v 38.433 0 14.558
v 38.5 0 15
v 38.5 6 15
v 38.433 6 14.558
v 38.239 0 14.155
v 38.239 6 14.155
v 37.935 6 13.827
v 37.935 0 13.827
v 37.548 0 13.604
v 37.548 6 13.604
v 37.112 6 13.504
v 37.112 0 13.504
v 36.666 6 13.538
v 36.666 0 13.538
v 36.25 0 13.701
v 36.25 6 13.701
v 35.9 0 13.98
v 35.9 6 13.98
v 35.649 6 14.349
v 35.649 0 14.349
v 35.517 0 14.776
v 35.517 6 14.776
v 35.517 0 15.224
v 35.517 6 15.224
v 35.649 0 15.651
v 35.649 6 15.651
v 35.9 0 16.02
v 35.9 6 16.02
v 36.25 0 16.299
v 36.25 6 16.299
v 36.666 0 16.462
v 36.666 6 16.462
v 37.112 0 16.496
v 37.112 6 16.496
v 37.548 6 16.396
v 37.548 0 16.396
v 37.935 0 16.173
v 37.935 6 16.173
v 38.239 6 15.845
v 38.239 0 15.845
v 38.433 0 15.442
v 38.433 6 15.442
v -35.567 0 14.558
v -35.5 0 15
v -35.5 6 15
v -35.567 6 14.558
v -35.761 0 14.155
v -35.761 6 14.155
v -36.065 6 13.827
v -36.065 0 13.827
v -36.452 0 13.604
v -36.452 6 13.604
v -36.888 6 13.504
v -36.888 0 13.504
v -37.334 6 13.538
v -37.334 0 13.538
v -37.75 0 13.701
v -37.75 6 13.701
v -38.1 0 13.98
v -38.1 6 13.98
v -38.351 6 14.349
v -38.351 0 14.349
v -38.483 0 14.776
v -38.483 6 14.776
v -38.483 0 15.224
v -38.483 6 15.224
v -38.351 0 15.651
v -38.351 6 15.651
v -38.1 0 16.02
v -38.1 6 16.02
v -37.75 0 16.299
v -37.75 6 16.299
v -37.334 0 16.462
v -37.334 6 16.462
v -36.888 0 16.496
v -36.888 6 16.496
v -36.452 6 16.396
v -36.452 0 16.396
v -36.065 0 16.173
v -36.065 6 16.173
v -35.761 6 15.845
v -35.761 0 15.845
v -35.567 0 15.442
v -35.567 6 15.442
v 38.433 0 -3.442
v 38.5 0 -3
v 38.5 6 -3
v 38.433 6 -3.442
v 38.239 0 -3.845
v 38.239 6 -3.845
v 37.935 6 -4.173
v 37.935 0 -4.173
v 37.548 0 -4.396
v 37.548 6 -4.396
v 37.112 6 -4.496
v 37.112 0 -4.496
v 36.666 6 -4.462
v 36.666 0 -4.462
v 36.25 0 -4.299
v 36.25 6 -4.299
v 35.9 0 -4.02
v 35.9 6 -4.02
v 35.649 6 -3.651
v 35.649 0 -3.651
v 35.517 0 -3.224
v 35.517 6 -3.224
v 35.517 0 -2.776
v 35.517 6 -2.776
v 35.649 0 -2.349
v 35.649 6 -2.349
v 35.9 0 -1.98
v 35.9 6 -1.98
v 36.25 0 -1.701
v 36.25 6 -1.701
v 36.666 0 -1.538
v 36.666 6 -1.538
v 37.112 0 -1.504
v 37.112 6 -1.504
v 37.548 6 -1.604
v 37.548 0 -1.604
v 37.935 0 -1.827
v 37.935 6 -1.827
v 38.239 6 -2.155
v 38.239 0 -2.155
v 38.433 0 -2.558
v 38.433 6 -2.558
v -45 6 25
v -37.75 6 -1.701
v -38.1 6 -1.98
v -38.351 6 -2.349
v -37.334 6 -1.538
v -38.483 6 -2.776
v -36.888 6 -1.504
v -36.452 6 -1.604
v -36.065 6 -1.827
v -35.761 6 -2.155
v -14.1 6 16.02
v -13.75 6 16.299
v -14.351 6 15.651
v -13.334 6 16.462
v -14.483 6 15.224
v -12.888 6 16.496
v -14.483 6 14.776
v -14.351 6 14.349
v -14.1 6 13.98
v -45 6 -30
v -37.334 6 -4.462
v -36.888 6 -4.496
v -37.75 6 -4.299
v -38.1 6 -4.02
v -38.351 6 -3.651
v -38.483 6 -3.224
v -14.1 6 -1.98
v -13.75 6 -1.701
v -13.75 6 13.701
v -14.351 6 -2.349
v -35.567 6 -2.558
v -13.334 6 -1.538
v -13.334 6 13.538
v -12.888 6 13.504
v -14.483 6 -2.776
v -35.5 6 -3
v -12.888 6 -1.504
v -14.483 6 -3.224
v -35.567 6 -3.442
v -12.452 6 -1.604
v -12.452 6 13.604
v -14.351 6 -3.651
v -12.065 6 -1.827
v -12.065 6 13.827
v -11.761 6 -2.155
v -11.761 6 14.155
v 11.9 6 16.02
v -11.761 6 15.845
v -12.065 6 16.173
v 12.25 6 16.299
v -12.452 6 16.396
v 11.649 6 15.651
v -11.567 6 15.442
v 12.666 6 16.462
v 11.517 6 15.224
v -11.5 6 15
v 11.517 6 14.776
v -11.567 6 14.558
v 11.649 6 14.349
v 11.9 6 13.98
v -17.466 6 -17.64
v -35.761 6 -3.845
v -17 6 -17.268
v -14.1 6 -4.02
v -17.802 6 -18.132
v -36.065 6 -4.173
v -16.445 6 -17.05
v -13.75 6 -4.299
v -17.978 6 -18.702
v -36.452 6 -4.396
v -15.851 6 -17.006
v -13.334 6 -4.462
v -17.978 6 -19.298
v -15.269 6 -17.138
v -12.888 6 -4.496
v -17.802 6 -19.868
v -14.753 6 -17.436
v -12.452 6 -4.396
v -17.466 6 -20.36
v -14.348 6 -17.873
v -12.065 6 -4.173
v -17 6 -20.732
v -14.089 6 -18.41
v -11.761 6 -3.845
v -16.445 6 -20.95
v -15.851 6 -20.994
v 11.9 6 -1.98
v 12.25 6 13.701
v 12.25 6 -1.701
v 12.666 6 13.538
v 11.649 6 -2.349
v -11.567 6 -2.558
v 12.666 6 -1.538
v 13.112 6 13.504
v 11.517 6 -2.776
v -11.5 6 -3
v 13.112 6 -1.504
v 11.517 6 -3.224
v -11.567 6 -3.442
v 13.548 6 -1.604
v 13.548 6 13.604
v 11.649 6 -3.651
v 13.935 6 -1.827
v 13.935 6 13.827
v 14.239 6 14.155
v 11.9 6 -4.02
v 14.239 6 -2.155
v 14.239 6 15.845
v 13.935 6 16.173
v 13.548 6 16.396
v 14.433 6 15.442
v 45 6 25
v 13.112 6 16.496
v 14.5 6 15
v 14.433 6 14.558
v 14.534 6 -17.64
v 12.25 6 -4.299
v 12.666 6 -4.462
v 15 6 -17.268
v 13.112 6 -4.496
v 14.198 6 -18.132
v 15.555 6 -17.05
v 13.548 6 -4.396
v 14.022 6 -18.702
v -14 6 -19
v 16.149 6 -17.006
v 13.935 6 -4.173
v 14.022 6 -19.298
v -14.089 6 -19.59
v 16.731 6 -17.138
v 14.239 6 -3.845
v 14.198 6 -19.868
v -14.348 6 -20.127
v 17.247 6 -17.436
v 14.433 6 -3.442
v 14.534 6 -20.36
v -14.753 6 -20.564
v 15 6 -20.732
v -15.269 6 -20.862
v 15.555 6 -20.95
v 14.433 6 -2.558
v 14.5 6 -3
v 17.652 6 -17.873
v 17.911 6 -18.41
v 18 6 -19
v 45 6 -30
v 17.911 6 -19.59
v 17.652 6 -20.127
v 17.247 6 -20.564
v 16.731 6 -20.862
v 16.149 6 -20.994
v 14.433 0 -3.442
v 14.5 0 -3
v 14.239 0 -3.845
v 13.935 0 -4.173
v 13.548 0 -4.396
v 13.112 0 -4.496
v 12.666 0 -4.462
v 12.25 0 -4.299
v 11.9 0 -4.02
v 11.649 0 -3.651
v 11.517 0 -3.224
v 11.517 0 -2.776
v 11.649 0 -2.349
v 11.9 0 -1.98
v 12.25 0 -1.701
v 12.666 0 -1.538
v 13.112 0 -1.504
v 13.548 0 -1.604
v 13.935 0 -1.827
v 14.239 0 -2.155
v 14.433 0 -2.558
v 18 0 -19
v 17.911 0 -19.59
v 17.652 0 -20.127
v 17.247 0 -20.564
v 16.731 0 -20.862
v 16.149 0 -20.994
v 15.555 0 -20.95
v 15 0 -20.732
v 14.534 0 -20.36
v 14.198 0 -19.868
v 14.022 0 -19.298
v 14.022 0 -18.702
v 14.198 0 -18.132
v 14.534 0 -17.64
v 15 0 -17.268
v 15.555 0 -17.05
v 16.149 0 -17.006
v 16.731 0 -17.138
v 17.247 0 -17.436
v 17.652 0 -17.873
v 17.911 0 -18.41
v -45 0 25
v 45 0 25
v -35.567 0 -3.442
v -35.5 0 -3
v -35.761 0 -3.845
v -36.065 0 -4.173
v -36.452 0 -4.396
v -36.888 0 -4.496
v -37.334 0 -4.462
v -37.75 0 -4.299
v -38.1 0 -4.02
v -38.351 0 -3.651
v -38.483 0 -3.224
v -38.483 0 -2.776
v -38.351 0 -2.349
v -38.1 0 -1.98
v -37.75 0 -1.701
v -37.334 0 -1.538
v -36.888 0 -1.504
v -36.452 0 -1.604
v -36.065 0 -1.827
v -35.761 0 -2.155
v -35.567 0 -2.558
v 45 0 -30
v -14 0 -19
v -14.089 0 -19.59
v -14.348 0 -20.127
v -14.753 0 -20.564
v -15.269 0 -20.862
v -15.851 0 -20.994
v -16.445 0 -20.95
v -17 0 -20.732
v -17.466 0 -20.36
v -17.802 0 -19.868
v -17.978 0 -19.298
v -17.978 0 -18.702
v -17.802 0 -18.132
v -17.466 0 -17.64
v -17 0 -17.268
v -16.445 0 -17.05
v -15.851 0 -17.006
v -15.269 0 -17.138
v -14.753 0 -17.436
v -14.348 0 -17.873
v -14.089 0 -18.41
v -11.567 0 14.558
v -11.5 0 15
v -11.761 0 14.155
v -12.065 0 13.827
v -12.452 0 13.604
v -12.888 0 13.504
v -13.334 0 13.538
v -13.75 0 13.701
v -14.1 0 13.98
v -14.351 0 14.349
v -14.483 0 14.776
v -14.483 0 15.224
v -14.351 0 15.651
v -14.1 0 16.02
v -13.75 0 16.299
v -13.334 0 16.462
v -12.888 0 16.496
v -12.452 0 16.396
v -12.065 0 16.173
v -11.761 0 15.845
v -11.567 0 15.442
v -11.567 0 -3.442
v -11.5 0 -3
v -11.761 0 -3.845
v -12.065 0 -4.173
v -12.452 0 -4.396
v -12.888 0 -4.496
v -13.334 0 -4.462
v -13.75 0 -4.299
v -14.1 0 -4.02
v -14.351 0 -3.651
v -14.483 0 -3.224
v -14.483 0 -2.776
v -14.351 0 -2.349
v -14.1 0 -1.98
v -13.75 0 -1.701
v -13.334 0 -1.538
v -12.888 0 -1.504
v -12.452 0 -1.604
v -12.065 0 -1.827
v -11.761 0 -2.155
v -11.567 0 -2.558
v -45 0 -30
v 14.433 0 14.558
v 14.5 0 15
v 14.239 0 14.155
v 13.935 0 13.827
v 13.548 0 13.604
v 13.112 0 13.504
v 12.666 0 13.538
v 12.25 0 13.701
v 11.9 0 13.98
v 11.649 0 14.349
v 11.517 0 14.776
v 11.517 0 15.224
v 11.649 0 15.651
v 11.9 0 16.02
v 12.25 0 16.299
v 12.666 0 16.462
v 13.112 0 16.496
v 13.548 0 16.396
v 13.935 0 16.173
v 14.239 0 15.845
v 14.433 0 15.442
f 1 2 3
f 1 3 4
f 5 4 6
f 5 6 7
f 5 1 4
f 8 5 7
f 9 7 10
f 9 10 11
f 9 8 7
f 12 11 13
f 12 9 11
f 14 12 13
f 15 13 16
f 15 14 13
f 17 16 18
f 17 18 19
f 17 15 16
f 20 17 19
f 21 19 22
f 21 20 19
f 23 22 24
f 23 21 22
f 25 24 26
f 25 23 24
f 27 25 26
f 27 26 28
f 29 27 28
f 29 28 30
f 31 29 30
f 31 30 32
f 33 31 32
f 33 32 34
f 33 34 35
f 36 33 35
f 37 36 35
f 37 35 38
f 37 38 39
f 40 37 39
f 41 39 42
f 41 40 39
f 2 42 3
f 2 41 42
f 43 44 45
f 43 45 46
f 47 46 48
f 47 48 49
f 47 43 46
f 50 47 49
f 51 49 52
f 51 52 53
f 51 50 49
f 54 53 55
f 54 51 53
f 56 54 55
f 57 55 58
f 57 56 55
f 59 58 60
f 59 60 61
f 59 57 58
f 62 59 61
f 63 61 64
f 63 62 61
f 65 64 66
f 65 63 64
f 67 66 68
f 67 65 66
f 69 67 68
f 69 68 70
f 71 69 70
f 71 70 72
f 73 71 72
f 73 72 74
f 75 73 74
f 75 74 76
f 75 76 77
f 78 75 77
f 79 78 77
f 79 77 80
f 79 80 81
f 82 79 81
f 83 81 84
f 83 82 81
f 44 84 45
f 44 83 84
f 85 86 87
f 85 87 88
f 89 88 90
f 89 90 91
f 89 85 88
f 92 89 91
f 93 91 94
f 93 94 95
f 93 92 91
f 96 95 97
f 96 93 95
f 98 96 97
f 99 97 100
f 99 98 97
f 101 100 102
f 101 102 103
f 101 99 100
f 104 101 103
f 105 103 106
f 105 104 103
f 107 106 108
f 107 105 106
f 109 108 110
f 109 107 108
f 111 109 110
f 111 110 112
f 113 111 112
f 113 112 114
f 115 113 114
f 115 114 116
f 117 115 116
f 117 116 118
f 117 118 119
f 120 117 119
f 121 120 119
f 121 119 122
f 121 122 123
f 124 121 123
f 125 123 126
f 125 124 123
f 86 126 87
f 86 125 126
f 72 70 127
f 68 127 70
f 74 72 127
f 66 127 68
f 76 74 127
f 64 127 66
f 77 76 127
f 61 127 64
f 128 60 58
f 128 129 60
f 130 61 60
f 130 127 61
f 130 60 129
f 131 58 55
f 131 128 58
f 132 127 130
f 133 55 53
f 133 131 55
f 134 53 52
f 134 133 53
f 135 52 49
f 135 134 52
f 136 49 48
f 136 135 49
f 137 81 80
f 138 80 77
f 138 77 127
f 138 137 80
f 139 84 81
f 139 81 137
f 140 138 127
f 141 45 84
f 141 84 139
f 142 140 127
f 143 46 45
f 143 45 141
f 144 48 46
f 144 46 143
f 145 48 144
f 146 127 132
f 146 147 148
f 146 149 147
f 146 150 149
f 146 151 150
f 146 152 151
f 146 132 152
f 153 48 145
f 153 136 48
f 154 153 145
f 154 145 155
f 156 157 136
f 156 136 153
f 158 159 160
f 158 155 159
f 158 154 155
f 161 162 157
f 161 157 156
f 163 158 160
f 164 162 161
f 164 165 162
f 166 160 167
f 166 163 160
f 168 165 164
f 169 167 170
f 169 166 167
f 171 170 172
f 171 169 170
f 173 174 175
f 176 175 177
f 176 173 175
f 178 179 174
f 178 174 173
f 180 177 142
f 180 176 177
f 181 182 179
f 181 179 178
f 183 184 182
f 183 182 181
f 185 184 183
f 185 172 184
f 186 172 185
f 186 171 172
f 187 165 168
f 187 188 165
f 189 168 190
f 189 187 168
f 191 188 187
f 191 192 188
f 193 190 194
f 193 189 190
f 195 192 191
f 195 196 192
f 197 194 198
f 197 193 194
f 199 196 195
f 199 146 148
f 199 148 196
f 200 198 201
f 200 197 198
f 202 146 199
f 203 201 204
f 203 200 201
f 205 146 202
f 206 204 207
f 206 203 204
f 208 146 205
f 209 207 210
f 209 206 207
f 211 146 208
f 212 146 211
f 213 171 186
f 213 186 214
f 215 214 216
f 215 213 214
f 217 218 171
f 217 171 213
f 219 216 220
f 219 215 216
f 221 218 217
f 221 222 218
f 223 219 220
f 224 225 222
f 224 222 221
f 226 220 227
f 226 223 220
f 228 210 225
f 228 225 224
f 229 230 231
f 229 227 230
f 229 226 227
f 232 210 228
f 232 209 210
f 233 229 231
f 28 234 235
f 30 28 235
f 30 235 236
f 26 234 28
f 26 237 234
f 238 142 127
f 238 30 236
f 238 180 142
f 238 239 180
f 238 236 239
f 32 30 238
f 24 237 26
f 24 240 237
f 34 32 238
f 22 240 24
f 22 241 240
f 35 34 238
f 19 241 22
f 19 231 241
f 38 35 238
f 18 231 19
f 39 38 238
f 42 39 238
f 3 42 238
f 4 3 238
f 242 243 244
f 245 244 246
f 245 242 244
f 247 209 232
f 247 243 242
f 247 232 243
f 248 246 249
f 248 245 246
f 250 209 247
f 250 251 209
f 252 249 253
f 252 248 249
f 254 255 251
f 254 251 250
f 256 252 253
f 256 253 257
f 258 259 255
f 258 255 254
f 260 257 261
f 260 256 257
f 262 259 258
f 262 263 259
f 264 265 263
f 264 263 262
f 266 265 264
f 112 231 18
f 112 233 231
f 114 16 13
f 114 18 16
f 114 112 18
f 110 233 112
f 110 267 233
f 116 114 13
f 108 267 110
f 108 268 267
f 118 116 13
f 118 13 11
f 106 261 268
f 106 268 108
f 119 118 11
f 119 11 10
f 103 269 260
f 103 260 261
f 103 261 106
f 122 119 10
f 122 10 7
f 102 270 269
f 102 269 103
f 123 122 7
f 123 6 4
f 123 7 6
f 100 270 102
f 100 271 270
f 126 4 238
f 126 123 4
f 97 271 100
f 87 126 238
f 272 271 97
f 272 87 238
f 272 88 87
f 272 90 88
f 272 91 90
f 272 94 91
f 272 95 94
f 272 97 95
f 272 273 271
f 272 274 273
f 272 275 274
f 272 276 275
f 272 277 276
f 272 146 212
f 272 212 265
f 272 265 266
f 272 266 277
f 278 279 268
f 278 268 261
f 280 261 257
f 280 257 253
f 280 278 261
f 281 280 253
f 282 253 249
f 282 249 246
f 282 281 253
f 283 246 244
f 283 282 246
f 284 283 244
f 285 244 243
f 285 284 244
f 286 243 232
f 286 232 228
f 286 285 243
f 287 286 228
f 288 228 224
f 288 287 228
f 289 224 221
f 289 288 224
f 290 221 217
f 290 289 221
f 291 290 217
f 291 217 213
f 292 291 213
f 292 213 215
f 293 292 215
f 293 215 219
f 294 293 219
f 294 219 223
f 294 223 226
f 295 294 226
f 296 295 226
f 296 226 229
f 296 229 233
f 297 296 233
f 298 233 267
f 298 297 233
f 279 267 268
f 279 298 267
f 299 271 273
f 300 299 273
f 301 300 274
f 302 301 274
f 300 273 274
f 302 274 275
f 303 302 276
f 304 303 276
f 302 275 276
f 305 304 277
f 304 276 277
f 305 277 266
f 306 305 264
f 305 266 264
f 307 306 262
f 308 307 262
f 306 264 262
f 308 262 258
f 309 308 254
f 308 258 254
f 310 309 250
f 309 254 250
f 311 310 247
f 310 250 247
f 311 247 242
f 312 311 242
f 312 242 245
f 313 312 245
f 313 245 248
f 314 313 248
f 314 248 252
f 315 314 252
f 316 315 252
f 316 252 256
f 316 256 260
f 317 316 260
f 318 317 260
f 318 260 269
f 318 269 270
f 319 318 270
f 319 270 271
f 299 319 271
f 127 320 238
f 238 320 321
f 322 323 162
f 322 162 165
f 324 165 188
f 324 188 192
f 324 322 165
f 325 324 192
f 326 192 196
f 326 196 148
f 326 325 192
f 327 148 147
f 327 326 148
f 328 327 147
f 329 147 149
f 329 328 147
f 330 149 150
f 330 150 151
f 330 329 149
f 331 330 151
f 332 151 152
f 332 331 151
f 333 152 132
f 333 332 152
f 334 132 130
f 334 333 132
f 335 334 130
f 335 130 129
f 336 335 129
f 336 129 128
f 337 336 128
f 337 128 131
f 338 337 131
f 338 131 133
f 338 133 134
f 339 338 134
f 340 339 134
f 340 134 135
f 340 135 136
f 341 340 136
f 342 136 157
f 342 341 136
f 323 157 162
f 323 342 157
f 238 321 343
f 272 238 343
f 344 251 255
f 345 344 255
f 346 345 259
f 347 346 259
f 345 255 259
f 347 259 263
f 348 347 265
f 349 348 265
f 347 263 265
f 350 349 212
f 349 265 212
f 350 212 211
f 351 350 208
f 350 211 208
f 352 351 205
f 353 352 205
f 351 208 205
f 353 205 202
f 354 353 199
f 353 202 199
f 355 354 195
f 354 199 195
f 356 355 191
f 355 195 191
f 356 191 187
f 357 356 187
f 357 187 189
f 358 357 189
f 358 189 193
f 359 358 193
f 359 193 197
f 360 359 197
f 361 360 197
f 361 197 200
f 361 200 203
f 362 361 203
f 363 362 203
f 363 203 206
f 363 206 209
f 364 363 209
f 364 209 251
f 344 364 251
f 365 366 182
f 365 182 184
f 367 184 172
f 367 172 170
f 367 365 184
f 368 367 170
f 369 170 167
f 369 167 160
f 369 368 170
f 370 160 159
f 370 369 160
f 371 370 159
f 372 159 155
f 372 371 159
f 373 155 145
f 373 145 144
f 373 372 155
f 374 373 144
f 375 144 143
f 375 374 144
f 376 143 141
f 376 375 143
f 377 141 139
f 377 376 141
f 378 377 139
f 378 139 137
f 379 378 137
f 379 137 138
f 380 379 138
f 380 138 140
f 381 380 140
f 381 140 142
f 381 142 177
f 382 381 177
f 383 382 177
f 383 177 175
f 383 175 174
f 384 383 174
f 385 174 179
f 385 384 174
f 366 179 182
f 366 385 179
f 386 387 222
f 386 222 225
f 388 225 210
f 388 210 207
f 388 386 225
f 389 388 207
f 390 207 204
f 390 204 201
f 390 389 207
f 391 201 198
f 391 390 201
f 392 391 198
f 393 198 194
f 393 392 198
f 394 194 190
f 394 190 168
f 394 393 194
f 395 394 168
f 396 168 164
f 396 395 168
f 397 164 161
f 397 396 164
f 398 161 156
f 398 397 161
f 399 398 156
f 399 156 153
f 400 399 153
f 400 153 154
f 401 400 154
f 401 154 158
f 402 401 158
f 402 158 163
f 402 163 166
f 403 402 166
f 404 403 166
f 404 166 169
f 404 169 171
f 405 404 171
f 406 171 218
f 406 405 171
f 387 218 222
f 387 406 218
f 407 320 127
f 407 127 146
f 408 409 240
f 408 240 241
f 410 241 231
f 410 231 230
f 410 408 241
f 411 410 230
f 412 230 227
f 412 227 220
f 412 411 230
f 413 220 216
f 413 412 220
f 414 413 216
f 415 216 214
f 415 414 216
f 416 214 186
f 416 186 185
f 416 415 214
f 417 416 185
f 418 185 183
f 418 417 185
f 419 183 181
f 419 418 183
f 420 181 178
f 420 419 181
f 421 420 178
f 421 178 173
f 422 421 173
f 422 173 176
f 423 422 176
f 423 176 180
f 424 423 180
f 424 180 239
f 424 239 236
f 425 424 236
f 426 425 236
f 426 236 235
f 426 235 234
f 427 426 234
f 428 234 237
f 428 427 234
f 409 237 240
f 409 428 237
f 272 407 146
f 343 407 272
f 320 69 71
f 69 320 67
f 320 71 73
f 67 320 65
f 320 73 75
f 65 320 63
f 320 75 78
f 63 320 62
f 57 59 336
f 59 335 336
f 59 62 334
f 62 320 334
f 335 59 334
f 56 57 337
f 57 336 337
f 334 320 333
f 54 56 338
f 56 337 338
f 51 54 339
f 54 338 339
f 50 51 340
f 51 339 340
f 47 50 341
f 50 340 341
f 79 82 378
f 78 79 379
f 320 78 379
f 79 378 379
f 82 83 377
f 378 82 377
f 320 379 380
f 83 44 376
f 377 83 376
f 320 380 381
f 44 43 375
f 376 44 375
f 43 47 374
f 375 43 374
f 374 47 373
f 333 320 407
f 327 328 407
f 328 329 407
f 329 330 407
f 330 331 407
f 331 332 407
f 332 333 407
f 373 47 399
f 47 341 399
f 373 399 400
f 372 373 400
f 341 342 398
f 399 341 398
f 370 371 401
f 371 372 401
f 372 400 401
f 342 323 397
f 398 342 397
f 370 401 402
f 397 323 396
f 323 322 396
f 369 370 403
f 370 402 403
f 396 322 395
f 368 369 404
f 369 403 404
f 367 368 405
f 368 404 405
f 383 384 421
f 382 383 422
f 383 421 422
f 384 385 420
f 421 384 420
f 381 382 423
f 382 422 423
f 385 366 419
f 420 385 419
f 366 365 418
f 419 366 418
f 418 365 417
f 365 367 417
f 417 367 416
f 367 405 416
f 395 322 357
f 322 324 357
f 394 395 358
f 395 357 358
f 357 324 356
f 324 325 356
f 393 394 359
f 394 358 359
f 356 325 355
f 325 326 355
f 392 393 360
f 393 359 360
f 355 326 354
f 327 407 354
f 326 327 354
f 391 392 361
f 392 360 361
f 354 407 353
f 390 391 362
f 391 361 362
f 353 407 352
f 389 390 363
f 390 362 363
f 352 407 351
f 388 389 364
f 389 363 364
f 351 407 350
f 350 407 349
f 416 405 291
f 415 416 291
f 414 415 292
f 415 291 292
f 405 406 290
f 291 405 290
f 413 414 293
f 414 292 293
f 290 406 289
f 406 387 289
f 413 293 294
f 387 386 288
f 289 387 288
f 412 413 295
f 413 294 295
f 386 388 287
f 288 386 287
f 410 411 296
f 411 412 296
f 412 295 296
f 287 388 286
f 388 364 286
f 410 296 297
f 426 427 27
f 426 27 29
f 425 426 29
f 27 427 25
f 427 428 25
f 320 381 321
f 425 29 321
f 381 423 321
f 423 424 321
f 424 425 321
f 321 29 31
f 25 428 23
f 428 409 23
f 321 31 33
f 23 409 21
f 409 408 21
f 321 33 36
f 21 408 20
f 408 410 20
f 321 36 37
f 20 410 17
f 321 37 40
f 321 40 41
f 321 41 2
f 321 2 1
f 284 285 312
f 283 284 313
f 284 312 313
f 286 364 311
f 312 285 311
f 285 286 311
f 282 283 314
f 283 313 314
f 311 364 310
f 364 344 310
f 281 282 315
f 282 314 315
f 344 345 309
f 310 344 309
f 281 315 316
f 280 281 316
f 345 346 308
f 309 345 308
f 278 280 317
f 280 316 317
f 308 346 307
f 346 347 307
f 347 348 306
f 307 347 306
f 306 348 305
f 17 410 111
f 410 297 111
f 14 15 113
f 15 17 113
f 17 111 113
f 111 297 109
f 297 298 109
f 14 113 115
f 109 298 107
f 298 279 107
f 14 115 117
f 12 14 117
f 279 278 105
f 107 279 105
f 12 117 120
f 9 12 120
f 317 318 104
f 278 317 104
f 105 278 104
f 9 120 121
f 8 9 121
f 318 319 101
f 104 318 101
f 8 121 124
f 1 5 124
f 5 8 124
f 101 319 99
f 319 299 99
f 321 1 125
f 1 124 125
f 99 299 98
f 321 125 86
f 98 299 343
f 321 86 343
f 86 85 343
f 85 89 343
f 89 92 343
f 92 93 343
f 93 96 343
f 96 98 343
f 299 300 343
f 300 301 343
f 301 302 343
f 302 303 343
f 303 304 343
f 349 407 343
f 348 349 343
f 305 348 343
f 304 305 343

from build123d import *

# Parameters (mm, degrees)
SKETCH1_W           = 90
SKETCH1_H           = 55
SKETCH1_R           = 1.5
BOSS_EXTRUDE1_DEPTH = 6
CUT_EXTRUDE1_REACH  = 8
SKETCH2_R           = 2


with BuildPart() as part:
    # Sketch1 → Boss-Extrude1 (new body)
    with BuildSketch(Plane(origin=(0, 0, 0), x_dir=(1, 0, 0), z_dir=(0, 1, 0))):
        with Locations((0, 2.5)):
            Rectangle(SKETCH1_W, SKETCH1_H)
        with Locations((37, 3)):
            Circle(SKETCH1_R, mode=Mode.SUBTRACT)
        with Locations((13, 3)):
            Circle(SKETCH1_R, mode=Mode.SUBTRACT)
        with Locations((37, -15)):
            Circle(SKETCH1_R, mode=Mode.SUBTRACT)
        with Locations((13, -15)):
            Circle(SKETCH1_R, mode=Mode.SUBTRACT)
        with Locations((-37, -15)):
            Circle(SKETCH1_R, mode=Mode.SUBTRACT)
        with Locations((-37, 3)):
            Circle(SKETCH1_R, mode=Mode.SUBTRACT)
        with Locations((-13, -15)):
            Circle(SKETCH1_R, mode=Mode.SUBTRACT)
        with Locations((-13, 3)):
            Circle(SKETCH1_R, mode=Mode.SUBTRACT)
    extrude(amount=BOSS_EXTRUDE1_DEPTH)

    # Sketch2 → Cut-Extrude1 (cut, up to next)
    with BuildSketch(Plane(origin=(0, 6, 0), x_dir=(1, 0, 0), z_dir=(0, 1, 0)), mode=Mode.PRIVATE) as cut_extrude1_sk1:
        with Locations((16, 19)):
            Circle(SKETCH2_R)
    cut_extrude1_tool1 = extrude(cut_extrude1_sk1.sketch, amount=-CUT_EXTRUDE1_REACH, mode=Mode.PRIVATE) & part.part
    add(cut_extrude1_tool1.solids().sort_by_distance((16, 6, -19))[0], mode=Mode.SUBTRACT)
    # Sketch2 → Cut-Extrude1 (cut, up to next)
    with BuildSketch(Plane(origin=(0, 6, 0), x_dir=(1, 0, 0), z_dir=(0, 1, 0)), mode=Mode.PRIVATE) as cut_extrude1_sk2:
        with Locations((-16, 19)):
            Circle(SKETCH2_R)
    cut_extrude1_tool2 = extrude(cut_extrude1_sk2.sketch, amount=-CUT_EXTRUDE1_REACH, mode=Mode.PRIVATE) & part.part
    add(cut_extrude1_tool2.solids().sort_by_distance((-16, 6, -19))[0], mode=Mode.SUBTRACT)


solid = part.part
